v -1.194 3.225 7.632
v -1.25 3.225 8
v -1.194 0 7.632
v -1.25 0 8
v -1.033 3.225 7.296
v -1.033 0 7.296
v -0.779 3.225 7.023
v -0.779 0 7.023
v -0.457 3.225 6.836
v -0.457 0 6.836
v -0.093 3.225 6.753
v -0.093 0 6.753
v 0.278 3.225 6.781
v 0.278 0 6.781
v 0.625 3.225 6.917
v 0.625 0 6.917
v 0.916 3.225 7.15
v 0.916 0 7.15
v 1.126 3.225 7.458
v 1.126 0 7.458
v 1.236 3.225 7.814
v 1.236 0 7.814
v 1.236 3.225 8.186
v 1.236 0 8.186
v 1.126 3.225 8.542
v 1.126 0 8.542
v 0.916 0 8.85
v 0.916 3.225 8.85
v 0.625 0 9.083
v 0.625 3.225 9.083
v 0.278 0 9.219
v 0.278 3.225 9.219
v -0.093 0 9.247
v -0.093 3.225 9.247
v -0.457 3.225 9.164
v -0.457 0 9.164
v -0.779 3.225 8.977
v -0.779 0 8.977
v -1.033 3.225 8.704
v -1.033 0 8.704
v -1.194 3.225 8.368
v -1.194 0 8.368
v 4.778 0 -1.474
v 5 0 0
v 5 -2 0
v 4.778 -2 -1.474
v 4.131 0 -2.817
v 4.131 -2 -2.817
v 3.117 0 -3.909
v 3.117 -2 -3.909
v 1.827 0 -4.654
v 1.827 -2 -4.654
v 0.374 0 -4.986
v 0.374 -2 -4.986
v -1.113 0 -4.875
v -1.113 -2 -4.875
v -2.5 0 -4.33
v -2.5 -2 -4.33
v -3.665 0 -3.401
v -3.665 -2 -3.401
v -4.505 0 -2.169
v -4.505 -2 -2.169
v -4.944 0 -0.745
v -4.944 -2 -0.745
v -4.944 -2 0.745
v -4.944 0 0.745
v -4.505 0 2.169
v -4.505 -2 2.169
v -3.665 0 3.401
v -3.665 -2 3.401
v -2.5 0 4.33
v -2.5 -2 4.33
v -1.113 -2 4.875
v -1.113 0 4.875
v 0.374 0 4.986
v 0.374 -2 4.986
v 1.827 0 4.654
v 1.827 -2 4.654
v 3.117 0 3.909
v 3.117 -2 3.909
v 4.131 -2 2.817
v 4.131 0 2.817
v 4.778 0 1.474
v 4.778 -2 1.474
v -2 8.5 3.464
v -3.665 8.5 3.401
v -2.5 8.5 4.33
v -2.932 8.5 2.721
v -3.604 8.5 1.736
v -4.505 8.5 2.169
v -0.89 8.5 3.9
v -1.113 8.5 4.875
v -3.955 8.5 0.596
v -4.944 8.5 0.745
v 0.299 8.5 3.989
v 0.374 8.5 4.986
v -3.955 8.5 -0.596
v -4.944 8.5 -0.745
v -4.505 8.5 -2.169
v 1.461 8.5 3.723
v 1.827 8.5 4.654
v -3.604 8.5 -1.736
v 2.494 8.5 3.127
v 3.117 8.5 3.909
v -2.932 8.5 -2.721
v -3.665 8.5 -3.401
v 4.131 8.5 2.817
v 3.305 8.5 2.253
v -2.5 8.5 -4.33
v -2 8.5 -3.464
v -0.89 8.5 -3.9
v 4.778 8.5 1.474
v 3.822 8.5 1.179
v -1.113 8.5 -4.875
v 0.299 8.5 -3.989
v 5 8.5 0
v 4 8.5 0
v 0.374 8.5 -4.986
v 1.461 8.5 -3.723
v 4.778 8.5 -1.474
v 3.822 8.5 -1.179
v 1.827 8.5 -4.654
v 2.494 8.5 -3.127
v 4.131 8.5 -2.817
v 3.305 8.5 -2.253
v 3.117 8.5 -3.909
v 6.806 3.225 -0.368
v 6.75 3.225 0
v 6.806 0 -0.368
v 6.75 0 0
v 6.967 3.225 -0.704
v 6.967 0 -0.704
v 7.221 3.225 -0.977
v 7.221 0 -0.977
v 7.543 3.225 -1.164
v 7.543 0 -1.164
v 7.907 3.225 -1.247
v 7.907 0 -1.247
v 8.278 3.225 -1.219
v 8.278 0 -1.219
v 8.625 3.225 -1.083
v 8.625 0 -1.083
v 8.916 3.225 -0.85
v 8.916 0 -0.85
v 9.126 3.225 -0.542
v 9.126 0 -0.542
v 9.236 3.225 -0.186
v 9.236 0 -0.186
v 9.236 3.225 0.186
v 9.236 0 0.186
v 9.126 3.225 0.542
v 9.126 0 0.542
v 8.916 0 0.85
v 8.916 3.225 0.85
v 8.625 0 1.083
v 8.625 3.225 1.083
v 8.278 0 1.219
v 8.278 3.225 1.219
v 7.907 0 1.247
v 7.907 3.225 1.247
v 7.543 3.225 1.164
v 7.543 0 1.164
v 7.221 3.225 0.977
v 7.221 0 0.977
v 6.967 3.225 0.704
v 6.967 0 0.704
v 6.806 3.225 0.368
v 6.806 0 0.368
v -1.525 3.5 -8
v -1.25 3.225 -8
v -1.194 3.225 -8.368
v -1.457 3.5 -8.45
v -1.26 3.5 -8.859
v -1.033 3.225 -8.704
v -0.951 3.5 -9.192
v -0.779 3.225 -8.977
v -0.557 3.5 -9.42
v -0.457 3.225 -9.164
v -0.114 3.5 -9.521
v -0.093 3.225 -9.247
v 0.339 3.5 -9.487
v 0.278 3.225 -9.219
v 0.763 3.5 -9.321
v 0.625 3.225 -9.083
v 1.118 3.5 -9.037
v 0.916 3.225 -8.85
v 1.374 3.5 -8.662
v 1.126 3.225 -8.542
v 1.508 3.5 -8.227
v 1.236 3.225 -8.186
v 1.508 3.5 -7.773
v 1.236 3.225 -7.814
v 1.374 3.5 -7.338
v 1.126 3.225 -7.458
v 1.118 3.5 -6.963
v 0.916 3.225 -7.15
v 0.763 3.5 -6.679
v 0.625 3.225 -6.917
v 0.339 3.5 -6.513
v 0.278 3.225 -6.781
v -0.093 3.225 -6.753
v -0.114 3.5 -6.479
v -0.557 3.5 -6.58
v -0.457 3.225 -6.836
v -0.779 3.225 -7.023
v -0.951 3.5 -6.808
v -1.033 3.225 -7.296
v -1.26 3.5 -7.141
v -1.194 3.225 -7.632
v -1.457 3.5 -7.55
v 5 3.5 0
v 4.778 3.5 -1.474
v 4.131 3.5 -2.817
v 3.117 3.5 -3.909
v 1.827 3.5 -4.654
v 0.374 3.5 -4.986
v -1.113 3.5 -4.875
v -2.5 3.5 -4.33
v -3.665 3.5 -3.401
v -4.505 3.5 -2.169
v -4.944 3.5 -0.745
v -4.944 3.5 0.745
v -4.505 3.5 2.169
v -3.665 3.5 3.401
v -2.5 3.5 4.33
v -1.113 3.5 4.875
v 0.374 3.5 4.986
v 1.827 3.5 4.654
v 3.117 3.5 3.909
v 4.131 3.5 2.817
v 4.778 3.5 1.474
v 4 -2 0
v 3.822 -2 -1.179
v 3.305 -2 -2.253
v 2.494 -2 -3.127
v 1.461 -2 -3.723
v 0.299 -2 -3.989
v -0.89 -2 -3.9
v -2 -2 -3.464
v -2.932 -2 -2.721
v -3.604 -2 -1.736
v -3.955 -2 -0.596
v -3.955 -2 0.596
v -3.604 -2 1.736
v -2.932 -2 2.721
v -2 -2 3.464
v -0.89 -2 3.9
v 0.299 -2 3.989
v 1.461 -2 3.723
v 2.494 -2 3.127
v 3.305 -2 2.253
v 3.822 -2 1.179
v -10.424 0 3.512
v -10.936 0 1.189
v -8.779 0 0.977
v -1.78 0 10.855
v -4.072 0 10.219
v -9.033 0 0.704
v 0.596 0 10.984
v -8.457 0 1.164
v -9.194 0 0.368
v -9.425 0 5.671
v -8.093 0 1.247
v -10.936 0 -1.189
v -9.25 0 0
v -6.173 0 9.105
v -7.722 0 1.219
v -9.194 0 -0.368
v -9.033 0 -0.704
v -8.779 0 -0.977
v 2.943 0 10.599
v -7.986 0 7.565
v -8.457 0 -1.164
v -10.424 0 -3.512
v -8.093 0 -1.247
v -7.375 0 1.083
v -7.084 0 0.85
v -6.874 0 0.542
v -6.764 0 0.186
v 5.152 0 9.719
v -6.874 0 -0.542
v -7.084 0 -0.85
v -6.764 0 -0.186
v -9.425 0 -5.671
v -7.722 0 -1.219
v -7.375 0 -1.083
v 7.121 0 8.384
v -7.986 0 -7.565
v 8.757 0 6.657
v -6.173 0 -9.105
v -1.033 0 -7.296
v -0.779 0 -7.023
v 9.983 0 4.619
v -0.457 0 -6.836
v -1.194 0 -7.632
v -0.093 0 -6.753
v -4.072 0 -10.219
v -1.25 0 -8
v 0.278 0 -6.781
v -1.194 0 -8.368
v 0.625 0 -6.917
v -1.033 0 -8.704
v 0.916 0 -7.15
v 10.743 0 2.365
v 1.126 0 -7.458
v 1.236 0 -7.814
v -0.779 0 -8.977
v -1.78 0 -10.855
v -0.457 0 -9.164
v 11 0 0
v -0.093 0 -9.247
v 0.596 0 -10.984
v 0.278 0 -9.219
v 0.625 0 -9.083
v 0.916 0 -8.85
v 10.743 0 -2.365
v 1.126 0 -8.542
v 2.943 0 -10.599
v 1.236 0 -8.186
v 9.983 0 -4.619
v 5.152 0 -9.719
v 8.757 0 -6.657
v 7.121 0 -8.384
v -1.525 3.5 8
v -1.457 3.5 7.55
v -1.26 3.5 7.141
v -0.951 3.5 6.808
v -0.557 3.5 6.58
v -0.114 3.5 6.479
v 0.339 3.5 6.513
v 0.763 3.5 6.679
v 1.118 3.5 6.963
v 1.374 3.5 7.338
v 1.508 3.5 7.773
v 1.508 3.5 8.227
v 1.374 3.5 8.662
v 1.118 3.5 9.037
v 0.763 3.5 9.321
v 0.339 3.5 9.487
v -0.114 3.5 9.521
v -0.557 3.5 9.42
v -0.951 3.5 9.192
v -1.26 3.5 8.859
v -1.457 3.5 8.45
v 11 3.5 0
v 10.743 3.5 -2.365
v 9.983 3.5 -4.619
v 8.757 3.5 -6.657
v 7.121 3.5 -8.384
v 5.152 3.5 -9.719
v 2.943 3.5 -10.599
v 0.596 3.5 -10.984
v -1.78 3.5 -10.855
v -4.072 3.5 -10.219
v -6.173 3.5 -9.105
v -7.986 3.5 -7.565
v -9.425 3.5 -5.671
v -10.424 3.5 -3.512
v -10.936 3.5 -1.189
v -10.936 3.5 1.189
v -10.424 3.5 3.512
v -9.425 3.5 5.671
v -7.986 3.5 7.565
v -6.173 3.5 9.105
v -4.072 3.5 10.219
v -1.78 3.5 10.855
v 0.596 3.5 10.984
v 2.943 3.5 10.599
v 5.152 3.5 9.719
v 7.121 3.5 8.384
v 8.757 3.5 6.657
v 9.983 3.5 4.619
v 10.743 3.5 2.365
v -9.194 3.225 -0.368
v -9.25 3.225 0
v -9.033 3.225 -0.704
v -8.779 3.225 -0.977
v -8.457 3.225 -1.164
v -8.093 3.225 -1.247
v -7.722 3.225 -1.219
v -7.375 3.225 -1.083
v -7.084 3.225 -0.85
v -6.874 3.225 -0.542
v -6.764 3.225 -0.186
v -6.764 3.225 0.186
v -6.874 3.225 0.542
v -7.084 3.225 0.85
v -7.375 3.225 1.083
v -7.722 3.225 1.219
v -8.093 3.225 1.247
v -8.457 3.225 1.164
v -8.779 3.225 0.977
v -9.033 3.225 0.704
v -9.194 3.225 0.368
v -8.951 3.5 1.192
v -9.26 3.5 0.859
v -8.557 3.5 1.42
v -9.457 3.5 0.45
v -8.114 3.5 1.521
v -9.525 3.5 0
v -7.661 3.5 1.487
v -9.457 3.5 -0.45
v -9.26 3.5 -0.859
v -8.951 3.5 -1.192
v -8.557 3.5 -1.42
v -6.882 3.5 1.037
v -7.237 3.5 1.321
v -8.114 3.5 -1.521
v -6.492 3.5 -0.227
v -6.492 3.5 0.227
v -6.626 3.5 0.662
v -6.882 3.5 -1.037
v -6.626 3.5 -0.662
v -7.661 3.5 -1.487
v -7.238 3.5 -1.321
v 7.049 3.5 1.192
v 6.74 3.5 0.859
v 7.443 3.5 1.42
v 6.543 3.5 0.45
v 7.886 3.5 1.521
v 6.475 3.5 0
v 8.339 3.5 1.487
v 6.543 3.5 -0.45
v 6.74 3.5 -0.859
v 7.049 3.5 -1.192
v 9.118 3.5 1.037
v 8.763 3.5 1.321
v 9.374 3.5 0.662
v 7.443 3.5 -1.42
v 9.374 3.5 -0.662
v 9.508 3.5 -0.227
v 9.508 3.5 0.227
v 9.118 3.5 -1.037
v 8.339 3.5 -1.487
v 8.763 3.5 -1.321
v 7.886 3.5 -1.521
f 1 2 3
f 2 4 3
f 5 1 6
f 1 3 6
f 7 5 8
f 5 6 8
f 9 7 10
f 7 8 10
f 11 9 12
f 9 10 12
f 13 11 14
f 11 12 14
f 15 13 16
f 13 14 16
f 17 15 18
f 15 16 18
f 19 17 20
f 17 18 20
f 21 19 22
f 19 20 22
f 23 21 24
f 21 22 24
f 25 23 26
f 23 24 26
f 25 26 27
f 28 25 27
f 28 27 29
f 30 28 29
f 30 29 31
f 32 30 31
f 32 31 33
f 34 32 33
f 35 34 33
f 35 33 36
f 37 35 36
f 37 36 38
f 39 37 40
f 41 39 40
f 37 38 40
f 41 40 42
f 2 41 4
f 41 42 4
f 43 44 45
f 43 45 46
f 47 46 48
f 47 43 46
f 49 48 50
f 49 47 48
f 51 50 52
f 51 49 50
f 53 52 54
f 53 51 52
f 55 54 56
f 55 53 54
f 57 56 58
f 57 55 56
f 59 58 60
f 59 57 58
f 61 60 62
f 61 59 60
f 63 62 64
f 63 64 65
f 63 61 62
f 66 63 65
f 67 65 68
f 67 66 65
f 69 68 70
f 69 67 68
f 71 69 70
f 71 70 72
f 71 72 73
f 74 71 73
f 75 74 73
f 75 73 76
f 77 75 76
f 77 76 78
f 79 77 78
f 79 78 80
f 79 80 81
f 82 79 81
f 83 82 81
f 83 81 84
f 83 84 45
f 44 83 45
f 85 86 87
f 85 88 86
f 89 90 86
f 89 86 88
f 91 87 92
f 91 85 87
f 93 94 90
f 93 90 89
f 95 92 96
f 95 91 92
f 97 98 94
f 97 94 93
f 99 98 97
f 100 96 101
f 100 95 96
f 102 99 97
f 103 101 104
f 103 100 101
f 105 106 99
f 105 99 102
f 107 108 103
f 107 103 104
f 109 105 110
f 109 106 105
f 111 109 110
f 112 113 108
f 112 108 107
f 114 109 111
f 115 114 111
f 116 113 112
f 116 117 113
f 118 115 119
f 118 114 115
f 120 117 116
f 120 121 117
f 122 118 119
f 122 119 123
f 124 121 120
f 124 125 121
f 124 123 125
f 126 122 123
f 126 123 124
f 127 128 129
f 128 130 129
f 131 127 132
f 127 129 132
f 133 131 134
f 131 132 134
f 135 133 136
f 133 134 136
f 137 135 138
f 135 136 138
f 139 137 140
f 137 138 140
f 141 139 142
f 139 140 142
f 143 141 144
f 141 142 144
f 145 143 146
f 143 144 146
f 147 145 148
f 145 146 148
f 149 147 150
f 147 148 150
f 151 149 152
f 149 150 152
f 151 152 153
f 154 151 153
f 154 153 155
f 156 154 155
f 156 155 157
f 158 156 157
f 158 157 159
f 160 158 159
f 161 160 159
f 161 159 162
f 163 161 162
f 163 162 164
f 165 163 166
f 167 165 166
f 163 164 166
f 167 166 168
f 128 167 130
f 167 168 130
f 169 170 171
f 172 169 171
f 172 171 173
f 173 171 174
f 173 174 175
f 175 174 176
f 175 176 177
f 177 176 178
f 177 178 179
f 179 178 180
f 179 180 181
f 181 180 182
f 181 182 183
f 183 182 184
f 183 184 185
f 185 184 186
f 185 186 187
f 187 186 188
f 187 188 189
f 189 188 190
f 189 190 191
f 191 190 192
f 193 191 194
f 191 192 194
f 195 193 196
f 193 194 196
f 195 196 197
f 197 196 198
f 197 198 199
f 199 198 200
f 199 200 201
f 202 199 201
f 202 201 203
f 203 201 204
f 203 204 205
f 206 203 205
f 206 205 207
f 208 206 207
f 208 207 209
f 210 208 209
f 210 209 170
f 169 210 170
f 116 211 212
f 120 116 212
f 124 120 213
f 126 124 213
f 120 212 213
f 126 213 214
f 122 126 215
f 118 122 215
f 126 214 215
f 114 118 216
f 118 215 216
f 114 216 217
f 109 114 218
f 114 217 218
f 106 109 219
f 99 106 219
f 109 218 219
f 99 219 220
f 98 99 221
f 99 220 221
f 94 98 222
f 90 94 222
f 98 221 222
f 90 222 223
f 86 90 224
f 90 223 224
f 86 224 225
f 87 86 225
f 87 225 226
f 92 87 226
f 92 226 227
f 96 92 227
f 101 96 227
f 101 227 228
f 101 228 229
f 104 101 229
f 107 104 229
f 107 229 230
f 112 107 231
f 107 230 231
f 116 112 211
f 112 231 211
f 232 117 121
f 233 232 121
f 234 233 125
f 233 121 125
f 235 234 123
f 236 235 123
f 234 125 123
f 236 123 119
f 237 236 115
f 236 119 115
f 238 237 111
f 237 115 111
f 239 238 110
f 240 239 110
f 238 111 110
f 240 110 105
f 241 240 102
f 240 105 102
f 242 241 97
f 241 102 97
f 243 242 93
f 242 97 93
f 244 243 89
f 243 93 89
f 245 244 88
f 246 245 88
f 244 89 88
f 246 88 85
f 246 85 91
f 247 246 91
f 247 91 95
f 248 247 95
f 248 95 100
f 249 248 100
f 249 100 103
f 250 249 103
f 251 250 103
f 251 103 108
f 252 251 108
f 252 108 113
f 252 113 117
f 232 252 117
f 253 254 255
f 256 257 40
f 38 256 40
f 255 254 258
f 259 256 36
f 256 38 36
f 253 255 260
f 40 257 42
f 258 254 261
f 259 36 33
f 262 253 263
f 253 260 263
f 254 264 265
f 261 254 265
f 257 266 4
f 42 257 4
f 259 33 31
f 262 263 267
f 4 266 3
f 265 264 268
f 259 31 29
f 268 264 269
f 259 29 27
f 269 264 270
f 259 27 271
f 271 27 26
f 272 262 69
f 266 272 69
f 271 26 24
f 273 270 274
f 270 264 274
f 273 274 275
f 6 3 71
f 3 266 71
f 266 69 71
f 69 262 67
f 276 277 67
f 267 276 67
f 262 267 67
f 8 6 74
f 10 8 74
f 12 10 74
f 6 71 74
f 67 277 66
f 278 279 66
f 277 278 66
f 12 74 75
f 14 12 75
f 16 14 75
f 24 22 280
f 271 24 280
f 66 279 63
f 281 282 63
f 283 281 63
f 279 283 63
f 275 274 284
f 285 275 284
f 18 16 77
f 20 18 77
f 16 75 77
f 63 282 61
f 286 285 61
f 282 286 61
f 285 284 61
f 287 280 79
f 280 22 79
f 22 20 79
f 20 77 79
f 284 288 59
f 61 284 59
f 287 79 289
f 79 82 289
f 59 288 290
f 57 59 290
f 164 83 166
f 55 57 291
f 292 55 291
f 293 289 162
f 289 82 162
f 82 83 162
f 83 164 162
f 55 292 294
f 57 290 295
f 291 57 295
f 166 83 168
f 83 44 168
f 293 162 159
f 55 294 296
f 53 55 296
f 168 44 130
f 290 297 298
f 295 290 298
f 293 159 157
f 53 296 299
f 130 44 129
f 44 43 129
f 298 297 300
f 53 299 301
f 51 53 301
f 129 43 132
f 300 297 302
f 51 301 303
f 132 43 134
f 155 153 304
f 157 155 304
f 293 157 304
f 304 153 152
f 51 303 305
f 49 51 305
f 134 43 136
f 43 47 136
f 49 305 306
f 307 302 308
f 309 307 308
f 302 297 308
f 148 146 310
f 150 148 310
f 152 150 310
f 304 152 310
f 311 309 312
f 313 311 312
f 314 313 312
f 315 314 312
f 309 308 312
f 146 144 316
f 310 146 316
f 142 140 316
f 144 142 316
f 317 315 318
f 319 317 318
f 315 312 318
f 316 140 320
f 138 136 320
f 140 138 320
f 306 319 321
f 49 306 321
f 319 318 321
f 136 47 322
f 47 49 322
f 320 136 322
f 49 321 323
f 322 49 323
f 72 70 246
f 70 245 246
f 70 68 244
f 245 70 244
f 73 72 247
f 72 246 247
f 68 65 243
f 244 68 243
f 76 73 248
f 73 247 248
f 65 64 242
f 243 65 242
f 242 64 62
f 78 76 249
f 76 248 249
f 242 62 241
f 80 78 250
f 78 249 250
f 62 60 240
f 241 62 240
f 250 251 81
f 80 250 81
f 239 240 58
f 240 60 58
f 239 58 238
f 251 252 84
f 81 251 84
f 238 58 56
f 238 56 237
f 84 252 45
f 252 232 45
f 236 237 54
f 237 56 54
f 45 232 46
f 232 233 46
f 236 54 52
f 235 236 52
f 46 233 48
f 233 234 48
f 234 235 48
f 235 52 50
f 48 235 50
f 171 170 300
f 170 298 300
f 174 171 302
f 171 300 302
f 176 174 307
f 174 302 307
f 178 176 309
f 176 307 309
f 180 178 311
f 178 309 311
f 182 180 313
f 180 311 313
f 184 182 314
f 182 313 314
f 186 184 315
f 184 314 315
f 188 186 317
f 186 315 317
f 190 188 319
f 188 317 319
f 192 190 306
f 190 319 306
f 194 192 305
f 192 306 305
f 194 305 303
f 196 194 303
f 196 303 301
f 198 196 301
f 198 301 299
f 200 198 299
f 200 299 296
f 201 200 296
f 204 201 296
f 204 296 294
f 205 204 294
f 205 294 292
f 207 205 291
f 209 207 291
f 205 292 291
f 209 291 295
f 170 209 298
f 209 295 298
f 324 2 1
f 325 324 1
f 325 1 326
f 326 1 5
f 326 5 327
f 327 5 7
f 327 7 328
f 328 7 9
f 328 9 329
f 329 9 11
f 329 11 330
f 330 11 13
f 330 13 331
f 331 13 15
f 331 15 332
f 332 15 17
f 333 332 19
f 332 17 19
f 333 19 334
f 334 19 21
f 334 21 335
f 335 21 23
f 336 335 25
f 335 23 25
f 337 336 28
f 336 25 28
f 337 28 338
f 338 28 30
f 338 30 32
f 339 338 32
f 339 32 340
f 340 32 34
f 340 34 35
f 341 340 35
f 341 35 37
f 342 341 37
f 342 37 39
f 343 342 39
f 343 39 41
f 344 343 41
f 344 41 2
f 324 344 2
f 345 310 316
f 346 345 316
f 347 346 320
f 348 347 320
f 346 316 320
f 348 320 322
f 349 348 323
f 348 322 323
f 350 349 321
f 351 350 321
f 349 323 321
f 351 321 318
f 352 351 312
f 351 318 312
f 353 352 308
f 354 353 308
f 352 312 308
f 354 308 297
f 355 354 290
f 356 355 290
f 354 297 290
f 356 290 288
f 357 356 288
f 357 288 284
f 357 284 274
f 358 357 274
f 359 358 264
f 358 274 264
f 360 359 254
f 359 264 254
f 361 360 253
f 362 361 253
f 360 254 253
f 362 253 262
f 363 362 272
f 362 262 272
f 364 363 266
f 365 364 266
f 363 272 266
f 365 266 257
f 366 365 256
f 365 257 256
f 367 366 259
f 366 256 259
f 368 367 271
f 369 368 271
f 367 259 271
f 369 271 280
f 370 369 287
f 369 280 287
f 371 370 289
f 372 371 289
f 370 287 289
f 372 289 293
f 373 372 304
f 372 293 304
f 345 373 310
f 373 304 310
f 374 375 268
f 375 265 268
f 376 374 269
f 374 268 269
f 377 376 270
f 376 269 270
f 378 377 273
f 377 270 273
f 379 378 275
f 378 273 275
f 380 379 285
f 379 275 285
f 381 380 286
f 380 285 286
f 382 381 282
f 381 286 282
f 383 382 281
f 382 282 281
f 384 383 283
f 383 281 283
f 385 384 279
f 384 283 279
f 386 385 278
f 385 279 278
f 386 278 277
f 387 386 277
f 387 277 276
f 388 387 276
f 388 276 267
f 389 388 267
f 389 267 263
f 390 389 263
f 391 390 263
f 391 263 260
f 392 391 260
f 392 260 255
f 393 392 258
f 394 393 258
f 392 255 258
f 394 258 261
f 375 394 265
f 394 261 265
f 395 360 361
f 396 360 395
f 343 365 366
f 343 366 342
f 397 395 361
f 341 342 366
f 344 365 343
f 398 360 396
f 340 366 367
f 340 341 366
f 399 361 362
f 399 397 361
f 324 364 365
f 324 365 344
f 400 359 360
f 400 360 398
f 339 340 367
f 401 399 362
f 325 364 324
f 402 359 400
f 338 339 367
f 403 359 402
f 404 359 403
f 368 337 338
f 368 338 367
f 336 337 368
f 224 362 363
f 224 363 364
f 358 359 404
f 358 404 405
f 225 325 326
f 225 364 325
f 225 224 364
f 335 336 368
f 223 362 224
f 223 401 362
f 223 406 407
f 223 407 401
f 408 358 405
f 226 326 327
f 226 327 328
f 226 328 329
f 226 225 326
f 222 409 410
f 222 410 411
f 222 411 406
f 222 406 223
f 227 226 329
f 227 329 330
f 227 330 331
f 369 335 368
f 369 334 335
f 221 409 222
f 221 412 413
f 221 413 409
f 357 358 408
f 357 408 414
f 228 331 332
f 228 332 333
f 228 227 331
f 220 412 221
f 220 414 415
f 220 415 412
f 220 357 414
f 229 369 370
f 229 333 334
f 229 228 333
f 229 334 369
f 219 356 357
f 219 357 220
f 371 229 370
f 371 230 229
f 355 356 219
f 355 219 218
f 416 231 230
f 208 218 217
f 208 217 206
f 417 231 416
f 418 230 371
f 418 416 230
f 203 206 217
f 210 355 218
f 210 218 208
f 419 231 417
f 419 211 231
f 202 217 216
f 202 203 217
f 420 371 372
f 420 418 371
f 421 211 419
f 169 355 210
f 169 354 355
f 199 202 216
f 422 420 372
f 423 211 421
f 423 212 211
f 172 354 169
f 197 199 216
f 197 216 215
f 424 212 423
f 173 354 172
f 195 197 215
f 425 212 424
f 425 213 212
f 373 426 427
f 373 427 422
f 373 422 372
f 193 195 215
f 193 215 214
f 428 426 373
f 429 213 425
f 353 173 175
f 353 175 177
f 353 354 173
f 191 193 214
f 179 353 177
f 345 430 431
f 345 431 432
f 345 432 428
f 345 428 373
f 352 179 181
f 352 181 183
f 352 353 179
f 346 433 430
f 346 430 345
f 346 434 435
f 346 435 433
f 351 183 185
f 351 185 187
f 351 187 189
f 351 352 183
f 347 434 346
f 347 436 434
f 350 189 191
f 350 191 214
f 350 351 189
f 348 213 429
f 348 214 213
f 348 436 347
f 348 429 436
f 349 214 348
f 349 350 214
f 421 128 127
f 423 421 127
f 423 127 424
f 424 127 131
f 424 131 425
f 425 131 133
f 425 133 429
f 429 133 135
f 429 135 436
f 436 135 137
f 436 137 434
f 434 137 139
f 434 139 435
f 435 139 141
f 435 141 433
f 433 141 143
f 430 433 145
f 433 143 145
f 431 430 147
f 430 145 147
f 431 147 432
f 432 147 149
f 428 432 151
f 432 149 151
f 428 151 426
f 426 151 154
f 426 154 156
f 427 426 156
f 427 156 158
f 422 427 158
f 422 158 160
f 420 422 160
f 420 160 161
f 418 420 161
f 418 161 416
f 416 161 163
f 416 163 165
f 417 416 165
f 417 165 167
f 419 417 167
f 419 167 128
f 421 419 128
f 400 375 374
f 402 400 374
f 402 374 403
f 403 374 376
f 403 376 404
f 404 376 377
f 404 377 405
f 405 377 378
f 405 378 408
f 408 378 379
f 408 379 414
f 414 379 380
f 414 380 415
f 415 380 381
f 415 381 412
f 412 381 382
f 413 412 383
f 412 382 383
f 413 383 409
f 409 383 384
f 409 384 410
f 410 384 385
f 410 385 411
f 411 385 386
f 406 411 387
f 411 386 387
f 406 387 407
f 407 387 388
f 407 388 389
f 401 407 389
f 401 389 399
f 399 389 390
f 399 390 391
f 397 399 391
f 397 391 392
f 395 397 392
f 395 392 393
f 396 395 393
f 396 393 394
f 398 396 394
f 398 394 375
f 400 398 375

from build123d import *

# Parameters (mm, degrees)
SKETCH_1_R                   = 11
EXTRUDE_1_DEPTH              = 3.5
SKETCH_2_R                   = 5
EXTRUDE_2_DEPTH              = 5
EXTRUDE_2_DEPTH_BACK         = 5.5
SKETCH_3_R                   = 1.15
CUT_EXTRUDE_1_DEPTH          = 5
SKETCH_4_R                   = 4
CUT_EXTRUDE_2_DEPTH          = 11.5
HOLE_WIZARD_M3_1_D           = 2.5
HOLE_WIZARD_M3_1_DEPTH       = 8.5
HOLE_WIZARD_M3_1_CSINK_D     = 3.05
HOLE_WIZARD_M3_1_CSINK_ANGLE = 90
HOLE_WIZARD_M3_1_TIP         = 0.751075774


with BuildPart() as part:
    # 草图1 → 凸台-拉伸1 (new body)
    with BuildSketch(Plane(origin=(0, 0, 0), x_dir=(1, 0, 0), z_dir=(0, 1, 0))):
        Circle(SKETCH_1_R)
    extrude(amount=EXTRUDE_1_DEPTH)

    # 草图2 → 凸台-拉伸2 (add, two sides)
    with BuildSketch(Plane(origin=(0, 3.5, 0), x_dir=(1, 0, 0), z_dir=(0, 1, 0))) as extrude_2_sk:
        Circle(SKETCH_2_R)
    extrude(amount=EXTRUDE_2_DEPTH)
    extrude(extrude_2_sk.sketch, amount=-EXTRUDE_2_DEPTH_BACK)

    # 草图3 → 切除-拉伸1 (cut)
    with BuildSketch(Plane(origin=(0, 3.5, 0), x_dir=(1, 0, 0), z_dir=(0, 1, 0))):
        with Locations((0, 8)):
            Circle(SKETCH_3_R)
        with Locations((8, 0)):
            Circle(SKETCH_3_R)
        with Locations((0, -8)):
            Circle(SKETCH_3_R)
        with Locations((-8, 0)):
            Circle(SKETCH_3_R)
    extrude(amount=-CUT_EXTRUDE_1_DEPTH, mode=Mode.SUBTRACT)

    # 草图4 → 切除-拉伸2 (cut, through all)
    with BuildSketch(Plane(origin=(0, 8.5, 0), x_dir=(1, 0, 0), z_dir=(0, 1, 0))):
        Circle(SKETCH_4_R)
    extrude(amount=-CUT_EXTRUDE_2_DEPTH, mode=Mode.SUBTRACT)

    # M3 螺纹孔1
    with Locations(Plane(origin=(0, 3.5, 0), x_dir=(1, 0, 0), z_dir=(0, 1, 0))):
        with Locations((0, 8), (8, 0), (0, -8), (-8, 0)):
            CounterSinkHole(HOLE_WIZARD_M3_1_D / 2, HOLE_WIZARD_M3_1_CSINK_D / 2, depth=HOLE_WIZARD_M3_1_DEPTH, counter_sink_angle=HOLE_WIZARD_M3_1_CSINK_ANGLE)
            with Locations((0, 0, -(HOLE_WIZARD_M3_1_DEPTH + HOLE_WIZARD_M3_1_TIP / 2))):  # 118° drill point
                Cone(0, HOLE_WIZARD_M3_1_D / 2, HOLE_WIZARD_M3_1_TIP, mode=Mode.SUBTRACT)


solid = part.part
